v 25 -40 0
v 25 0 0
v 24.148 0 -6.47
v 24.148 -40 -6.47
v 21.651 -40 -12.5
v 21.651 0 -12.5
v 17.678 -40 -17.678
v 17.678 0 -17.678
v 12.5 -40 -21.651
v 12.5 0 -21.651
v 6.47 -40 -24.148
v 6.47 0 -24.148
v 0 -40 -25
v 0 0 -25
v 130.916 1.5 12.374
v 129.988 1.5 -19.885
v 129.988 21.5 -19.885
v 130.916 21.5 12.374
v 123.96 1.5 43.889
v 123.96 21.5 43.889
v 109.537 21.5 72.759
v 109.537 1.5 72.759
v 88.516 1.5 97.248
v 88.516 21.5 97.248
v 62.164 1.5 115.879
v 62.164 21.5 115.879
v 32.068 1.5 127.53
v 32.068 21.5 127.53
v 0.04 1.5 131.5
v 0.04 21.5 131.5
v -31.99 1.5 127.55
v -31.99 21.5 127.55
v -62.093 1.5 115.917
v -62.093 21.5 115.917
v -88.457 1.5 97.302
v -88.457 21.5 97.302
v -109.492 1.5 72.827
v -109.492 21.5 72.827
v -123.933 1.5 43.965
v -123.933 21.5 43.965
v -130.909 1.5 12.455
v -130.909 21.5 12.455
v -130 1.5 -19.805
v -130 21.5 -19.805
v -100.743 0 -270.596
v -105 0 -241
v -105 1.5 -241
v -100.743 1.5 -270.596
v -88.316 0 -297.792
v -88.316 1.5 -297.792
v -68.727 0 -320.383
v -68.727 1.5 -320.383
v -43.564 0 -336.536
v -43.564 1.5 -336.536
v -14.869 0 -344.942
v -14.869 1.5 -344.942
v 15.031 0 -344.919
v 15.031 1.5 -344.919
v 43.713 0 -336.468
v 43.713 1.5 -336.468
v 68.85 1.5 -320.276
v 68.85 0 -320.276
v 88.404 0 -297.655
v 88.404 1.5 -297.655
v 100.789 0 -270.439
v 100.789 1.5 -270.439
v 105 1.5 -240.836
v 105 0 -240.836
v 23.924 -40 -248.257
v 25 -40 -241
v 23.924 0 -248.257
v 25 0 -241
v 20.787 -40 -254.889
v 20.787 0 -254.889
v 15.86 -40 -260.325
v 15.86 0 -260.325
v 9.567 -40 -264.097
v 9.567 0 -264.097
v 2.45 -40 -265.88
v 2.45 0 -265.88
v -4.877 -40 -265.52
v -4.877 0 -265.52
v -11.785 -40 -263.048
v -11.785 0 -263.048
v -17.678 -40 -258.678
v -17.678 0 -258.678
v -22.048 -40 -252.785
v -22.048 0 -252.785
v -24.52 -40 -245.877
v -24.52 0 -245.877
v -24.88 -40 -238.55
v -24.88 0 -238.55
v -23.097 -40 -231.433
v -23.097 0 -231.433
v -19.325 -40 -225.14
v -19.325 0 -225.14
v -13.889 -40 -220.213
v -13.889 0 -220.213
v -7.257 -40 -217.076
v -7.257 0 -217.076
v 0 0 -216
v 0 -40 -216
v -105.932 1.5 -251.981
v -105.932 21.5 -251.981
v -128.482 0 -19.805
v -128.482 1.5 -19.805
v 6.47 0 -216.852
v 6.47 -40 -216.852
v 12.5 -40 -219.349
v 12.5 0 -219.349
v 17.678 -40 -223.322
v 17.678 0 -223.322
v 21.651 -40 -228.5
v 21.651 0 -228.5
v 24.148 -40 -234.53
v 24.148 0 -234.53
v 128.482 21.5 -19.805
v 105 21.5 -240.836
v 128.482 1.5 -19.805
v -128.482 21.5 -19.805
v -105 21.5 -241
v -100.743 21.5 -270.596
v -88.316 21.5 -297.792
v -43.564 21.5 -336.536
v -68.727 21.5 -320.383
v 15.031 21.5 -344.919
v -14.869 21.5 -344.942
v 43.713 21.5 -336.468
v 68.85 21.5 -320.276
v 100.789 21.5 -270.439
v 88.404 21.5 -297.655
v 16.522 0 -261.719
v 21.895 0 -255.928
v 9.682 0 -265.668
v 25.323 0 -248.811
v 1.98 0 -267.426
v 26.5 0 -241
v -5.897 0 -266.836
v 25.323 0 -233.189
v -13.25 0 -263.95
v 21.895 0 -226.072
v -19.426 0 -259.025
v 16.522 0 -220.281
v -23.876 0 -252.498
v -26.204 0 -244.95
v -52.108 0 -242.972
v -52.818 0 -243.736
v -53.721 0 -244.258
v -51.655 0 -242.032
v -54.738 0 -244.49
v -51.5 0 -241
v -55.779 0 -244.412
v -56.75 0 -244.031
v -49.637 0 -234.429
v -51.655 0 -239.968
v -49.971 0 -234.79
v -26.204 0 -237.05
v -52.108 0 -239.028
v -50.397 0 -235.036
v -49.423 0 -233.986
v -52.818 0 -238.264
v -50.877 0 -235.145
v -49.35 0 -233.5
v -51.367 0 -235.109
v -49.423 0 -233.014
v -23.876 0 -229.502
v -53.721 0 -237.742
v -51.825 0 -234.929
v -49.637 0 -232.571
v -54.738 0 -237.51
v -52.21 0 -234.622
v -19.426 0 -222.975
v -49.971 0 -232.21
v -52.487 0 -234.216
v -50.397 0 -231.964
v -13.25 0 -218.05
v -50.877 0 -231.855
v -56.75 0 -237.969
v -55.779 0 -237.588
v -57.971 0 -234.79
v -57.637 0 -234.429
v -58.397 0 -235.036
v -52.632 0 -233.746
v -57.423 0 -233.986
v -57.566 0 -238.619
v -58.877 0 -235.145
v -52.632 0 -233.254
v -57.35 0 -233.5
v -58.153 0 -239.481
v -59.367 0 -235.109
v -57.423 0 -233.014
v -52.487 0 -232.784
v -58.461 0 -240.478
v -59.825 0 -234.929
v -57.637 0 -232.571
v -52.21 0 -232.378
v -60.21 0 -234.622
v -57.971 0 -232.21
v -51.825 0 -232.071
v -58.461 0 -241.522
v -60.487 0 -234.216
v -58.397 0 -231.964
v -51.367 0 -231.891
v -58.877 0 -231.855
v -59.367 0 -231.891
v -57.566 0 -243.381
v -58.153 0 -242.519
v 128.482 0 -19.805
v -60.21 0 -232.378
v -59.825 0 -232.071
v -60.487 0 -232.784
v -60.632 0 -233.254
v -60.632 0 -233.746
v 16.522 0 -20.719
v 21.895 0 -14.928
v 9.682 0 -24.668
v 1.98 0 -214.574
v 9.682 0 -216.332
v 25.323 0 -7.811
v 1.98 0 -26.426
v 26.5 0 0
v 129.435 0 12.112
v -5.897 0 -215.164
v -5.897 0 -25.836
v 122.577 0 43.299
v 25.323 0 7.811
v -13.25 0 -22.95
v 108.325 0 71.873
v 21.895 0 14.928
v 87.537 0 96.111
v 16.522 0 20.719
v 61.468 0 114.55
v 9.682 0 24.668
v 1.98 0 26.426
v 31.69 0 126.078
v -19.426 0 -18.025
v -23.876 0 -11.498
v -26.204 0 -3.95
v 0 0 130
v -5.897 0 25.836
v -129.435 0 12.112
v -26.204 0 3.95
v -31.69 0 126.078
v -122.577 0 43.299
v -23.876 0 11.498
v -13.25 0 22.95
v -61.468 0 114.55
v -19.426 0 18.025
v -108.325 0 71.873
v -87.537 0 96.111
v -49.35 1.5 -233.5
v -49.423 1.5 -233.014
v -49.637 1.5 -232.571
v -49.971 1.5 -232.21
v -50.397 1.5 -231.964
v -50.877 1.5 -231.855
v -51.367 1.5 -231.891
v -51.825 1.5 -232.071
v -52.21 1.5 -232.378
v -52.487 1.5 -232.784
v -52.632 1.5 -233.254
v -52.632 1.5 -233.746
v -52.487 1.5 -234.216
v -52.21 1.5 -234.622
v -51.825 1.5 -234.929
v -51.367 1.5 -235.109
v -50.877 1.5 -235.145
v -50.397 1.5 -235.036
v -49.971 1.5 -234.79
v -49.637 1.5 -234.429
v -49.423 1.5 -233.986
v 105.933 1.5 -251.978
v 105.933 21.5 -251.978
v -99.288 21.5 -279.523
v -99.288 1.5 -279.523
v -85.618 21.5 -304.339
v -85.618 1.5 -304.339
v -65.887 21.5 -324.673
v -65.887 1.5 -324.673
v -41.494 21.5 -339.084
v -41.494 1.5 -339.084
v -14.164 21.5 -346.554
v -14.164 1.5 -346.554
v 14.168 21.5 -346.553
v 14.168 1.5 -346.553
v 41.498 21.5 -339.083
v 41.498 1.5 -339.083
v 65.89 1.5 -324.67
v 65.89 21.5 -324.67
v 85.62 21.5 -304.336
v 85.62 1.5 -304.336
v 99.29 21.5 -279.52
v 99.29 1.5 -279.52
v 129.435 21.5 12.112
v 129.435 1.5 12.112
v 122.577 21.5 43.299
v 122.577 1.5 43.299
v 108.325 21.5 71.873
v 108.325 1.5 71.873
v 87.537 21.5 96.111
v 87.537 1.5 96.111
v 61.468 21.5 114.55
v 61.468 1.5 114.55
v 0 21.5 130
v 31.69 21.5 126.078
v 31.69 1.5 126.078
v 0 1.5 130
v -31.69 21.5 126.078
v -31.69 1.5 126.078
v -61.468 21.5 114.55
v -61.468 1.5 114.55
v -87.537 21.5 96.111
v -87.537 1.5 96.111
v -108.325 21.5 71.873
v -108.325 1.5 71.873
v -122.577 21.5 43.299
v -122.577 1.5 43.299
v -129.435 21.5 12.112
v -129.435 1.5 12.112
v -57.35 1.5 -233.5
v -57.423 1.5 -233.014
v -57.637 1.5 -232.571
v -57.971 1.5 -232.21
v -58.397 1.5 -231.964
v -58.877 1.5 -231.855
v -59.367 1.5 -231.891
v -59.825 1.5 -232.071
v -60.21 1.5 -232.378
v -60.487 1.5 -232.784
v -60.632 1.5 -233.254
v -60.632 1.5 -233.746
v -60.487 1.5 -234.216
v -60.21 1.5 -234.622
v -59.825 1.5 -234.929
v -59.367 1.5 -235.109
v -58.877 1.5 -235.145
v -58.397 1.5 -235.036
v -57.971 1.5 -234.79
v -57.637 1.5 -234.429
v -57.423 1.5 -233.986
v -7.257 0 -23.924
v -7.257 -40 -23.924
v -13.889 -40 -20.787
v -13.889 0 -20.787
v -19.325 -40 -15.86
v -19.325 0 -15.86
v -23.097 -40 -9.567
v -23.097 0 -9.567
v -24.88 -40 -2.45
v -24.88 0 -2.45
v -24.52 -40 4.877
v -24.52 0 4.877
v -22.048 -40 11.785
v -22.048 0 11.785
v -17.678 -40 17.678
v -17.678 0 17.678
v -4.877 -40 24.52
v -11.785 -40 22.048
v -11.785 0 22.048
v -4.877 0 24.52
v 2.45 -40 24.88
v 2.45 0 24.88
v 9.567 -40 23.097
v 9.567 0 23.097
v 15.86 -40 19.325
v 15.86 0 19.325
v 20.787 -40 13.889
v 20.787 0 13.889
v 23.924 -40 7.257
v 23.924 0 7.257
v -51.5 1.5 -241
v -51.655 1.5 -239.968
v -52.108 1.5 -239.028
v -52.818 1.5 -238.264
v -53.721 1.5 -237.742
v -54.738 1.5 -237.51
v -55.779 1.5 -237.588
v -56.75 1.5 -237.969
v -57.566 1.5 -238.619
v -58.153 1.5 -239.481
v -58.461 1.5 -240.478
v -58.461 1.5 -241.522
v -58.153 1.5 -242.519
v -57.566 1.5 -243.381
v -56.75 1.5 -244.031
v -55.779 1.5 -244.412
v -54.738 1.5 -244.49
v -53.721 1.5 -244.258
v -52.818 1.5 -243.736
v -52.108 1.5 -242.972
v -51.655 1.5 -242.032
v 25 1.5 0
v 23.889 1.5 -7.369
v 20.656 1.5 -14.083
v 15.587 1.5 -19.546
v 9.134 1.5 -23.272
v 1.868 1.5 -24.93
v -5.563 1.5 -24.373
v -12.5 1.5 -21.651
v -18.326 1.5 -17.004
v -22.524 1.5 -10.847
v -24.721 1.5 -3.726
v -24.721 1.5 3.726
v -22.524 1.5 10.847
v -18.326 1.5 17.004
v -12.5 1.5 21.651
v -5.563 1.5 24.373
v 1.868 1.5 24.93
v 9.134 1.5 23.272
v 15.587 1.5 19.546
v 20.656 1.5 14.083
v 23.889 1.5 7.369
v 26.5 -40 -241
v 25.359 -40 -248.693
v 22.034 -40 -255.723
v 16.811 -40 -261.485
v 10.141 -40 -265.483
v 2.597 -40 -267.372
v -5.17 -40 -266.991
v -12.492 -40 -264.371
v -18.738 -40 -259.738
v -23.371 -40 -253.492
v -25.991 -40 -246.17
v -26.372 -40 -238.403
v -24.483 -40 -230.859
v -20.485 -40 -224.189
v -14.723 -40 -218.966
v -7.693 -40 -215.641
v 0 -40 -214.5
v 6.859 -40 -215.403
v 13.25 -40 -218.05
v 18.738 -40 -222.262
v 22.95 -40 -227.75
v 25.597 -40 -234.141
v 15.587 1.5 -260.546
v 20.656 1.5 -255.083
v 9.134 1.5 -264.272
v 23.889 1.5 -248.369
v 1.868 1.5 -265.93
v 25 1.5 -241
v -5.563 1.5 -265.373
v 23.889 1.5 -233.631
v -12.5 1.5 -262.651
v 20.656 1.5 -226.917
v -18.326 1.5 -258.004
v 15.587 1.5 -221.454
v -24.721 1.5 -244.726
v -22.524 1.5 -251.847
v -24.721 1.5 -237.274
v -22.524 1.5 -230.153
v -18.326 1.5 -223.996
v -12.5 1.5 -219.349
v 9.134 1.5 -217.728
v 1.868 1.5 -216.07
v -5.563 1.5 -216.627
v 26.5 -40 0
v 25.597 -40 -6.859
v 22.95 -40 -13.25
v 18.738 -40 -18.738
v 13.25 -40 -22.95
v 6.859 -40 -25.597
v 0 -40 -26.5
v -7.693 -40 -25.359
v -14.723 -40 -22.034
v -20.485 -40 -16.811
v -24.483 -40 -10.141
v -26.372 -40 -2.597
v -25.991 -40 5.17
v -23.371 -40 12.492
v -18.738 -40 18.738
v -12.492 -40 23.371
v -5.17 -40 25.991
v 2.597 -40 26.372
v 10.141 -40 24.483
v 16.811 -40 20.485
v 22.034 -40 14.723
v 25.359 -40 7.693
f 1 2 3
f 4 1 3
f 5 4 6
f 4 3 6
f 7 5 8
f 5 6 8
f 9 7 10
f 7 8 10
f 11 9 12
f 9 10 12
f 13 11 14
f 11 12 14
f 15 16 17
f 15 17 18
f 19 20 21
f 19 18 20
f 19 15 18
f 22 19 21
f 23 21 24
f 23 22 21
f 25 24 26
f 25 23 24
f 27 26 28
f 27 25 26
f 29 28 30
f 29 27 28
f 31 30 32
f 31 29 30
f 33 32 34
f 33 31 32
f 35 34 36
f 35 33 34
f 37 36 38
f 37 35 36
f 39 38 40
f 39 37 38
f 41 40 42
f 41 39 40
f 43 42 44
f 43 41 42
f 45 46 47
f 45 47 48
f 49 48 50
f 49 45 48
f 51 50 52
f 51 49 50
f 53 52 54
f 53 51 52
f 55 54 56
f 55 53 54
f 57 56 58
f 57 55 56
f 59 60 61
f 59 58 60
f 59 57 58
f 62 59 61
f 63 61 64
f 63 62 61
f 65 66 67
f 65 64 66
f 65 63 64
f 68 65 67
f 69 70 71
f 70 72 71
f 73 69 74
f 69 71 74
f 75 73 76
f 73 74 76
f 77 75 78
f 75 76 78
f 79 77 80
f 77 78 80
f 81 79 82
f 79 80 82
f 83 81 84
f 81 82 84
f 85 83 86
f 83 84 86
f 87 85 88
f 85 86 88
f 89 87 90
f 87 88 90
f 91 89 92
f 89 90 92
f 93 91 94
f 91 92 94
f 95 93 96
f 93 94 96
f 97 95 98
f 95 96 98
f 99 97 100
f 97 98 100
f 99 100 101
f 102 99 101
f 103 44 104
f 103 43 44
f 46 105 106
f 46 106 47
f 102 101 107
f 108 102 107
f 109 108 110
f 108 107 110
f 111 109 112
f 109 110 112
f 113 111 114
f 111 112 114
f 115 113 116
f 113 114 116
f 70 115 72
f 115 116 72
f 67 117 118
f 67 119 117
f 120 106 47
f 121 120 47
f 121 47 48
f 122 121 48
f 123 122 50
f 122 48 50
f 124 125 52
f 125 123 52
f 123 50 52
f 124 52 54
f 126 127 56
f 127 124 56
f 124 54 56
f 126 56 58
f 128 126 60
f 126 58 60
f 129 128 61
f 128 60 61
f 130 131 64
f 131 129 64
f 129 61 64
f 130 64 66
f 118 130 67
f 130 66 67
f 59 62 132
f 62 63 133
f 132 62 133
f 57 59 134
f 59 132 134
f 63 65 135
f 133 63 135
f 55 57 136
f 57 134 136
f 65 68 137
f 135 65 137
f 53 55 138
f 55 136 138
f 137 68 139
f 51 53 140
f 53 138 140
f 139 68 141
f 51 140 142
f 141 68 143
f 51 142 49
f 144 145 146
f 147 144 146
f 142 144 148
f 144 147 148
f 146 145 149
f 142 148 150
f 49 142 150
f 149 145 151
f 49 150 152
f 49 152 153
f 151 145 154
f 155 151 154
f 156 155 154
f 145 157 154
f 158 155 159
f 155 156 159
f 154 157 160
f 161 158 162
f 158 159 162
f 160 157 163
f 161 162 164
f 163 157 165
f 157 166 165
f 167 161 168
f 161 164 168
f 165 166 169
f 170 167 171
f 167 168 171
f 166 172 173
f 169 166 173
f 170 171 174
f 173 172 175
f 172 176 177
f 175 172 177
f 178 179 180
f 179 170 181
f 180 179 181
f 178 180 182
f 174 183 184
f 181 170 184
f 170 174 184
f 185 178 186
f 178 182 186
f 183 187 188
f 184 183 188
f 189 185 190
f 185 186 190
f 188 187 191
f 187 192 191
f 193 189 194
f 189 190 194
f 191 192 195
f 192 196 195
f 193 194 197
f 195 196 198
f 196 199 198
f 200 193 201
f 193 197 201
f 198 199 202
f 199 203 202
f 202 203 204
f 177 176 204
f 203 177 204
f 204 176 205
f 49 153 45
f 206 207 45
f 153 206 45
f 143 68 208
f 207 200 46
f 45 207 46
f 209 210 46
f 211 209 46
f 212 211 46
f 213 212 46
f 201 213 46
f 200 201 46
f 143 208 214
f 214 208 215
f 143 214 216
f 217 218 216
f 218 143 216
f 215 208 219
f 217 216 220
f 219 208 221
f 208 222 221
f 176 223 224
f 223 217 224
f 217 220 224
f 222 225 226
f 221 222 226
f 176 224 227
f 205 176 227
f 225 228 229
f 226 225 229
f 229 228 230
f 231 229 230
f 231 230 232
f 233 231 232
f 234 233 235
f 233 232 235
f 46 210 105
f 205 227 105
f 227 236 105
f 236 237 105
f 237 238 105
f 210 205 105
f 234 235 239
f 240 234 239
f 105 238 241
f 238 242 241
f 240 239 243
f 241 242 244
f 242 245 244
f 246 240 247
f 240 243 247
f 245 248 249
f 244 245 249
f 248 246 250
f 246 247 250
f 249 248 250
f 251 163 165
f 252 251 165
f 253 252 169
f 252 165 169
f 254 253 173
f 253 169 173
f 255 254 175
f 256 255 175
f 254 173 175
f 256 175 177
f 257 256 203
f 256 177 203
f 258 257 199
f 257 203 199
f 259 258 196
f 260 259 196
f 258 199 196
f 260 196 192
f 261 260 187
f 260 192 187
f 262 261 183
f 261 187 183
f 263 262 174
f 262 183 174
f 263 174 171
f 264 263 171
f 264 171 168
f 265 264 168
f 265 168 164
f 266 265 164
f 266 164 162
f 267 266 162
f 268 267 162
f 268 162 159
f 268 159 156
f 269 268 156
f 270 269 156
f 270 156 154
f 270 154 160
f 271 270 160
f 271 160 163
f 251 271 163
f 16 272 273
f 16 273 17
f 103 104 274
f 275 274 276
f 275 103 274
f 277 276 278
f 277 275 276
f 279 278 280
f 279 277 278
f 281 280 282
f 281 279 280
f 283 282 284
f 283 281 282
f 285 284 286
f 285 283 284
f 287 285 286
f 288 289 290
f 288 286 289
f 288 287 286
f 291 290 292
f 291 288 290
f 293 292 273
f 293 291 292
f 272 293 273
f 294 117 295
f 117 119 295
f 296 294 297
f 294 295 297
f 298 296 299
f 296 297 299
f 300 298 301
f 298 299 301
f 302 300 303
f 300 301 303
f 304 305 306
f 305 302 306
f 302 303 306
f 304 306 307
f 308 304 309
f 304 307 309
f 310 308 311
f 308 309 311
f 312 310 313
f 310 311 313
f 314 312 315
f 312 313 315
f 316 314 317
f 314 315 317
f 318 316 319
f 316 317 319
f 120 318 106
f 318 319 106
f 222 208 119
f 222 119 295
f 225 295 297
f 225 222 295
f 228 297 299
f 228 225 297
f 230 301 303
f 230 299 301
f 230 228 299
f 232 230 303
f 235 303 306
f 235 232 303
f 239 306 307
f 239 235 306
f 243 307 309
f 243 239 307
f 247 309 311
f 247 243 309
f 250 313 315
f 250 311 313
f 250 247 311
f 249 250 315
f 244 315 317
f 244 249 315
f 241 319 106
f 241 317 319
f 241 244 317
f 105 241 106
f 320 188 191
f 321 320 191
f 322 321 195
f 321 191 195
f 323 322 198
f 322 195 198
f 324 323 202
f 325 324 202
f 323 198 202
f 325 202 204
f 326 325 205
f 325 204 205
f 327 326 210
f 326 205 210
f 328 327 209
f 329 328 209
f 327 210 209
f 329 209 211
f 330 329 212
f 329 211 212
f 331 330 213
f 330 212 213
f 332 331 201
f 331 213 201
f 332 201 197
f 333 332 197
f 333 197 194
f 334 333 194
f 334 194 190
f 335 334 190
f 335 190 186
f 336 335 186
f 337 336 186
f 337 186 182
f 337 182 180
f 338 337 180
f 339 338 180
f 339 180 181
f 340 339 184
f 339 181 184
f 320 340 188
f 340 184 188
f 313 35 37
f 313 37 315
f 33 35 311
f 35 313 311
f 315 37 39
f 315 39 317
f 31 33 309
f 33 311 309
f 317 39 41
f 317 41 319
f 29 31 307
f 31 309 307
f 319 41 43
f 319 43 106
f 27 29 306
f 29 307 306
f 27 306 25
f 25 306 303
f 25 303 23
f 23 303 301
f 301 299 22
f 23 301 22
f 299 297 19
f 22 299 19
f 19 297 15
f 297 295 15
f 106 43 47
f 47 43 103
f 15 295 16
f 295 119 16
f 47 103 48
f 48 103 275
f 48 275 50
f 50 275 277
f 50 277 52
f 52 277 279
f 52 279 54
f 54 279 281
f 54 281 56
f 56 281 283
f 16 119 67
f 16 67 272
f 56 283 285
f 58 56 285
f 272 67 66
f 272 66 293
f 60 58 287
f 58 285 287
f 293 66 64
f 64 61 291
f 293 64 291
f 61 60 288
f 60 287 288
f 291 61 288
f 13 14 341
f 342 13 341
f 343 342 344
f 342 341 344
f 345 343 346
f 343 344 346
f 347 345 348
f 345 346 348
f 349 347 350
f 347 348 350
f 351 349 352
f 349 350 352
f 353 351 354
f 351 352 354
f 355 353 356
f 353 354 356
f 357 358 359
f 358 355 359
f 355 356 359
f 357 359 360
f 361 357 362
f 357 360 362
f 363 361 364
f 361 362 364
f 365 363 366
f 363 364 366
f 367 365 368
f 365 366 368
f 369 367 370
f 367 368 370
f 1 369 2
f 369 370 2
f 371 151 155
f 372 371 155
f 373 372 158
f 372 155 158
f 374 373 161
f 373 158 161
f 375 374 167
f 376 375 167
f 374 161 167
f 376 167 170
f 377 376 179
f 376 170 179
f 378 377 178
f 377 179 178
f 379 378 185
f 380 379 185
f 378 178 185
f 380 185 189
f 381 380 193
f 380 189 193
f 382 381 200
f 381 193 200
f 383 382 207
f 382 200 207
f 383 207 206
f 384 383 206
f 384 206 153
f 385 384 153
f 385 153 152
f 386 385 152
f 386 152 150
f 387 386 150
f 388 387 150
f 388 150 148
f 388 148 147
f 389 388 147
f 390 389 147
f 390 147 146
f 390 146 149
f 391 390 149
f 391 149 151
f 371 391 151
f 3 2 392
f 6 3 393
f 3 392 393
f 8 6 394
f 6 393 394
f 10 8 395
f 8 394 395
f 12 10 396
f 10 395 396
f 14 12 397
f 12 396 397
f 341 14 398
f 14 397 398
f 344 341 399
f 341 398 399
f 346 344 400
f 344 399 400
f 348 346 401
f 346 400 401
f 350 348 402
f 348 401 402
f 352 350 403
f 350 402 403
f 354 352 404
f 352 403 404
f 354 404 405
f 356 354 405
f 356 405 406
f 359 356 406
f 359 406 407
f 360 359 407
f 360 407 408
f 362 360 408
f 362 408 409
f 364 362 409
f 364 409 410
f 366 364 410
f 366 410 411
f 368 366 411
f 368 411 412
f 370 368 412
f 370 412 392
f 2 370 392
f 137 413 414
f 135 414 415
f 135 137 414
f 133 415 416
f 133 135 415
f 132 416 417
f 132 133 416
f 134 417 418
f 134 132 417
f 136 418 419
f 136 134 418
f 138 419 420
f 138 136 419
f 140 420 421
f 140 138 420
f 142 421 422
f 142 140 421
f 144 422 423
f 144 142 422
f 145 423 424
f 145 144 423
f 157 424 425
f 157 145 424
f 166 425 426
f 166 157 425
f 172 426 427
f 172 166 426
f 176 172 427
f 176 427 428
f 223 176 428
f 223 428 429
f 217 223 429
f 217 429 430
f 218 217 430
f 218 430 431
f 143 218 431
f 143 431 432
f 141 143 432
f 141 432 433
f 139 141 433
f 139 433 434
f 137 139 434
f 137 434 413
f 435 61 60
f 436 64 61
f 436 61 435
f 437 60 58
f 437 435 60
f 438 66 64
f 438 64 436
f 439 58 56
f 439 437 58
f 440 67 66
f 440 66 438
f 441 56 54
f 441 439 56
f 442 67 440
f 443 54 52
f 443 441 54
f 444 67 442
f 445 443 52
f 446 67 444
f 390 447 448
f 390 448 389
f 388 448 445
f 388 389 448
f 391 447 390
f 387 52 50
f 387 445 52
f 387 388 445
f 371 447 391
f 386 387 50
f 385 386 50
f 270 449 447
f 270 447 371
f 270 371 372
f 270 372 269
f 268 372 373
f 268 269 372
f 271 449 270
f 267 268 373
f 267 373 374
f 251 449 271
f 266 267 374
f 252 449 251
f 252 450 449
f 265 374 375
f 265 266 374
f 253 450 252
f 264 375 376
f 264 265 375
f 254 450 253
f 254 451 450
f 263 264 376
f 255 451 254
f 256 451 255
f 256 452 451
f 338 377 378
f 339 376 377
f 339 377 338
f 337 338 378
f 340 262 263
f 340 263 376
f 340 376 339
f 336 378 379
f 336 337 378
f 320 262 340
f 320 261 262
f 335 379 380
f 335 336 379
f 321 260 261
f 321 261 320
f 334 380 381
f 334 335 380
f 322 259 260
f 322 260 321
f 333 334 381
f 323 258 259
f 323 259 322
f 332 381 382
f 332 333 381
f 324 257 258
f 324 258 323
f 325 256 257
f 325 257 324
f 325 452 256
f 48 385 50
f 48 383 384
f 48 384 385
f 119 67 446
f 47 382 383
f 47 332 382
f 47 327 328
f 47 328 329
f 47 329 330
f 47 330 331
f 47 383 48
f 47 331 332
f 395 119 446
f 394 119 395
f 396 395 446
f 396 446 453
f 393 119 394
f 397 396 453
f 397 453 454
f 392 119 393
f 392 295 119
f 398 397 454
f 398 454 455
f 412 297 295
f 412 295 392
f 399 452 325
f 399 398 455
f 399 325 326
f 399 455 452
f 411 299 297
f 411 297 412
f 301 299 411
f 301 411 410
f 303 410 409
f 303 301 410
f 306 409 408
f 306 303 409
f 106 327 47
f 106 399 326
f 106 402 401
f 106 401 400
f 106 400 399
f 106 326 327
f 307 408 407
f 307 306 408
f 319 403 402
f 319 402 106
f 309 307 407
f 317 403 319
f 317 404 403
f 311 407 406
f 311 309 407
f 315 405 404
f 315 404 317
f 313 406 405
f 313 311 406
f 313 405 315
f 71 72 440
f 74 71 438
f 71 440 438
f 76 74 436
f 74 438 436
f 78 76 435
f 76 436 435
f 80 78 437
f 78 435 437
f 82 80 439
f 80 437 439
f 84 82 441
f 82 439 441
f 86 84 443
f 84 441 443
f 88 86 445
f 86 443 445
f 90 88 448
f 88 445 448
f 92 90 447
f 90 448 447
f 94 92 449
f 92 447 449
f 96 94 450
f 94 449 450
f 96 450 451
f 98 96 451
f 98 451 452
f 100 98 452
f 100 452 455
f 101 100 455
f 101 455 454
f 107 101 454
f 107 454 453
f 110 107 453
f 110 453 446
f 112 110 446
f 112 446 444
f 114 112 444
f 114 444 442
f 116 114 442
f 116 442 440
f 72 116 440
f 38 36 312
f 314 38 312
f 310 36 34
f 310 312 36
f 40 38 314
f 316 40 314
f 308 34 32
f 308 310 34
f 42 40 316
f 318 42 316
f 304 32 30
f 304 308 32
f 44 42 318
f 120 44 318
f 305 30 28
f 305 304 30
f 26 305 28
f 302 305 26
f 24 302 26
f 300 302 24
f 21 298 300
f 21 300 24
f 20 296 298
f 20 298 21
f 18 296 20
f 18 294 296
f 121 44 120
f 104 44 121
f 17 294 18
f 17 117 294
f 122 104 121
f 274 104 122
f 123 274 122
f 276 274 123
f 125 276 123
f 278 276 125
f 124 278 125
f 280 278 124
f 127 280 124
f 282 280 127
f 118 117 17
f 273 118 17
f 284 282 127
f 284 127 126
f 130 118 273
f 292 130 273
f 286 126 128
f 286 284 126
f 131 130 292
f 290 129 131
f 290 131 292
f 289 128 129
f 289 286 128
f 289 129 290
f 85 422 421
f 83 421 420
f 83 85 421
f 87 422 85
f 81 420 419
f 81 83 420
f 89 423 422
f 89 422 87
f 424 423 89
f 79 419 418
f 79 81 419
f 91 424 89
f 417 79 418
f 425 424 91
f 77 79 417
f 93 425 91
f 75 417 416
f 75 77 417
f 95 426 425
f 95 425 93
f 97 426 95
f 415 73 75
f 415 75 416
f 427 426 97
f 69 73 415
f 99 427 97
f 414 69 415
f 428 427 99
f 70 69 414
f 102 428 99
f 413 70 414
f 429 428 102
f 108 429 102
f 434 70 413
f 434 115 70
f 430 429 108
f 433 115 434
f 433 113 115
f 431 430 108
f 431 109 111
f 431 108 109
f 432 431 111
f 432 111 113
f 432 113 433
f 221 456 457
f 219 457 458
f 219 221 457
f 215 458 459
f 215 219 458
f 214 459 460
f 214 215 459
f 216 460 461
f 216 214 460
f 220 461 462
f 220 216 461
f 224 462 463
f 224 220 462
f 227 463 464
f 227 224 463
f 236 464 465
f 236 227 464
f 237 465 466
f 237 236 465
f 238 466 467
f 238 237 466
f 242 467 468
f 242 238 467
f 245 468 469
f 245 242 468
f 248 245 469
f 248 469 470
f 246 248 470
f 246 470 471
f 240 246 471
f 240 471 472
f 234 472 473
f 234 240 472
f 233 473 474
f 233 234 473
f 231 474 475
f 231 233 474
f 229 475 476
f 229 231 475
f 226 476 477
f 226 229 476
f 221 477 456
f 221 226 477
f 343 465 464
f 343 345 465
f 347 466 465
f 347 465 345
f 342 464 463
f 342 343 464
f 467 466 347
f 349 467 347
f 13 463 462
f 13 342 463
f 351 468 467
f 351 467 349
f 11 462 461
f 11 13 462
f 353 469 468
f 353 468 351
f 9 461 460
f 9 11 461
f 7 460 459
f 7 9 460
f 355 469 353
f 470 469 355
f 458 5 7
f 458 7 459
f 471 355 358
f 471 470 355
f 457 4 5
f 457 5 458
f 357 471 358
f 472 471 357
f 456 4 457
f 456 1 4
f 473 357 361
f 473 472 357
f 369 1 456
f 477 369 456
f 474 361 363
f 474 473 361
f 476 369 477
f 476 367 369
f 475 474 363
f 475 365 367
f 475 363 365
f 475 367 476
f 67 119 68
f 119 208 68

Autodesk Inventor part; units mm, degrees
ref_plane "YZ Plane" through (0, 0, 0) normal (1, 0, 0) x (0, 1, 0)
ref_plane "XZ Plane" through (0, 0, 0) normal (0, 1, 0) x (-1, 0, 0)
ref_plane "XY Plane" through (0, 0, 0) normal (0, 0, 1) x (1, 0, 0)
sketch "Esboço1" plane through (0, 0, 0) normal (0, 1, 0) x (-1, 0, 0)
  arc A0 (128.4825, -19.8053) -> (-128.4825, -19.8053) centre (0, 0) ccw
  arc A1 (130, -19.8053) -> (-130, -19.8053) centre (0, 0) ccw
  line L0 (0, 0) -> (0, -241) construction
  arc A2 (-104.9999, -240.8364) -> (105, -241) centre (0, -241) ccw
  arc A3 (-106.5, -241) -> (106.5, -241) centre (0, -241) ccw
  line L1 (130, -19.8053) -> (106.5, -241)
  line L2 (-130, -19.8053) -> (-106.5, -241)
  line L3 (128.4825, -19.8053) -> (105, -241)
  line L4 (-128.4825, -19.8053) -> (-104.9999, -240.8364)
  dimension "d0" = 260
  dimension "d1" = 263
  dimension "d2" = 241
  dimension "d3" = 210
  dimension "d4" = 213
extrude "Extrusão1" add sketch "Esboço1" along normal blind 1.5 contours L3 A2 L4 A0
sketch "Esboço2" plane through (0, 1.5, 0) normal (0, 1, 0) x (1, 0, 0)
  arc A0 (-130, 19.8053) -> (129.9878, 19.8852) centre (0, 0) ccw
  line L0 (0, 0) -> (0, 241) construction
  arc A1 (105.9327, 251.9775) -> (-105.9324, 251.9811) centre (0, 241) ccw
  line L1 (-130, 19.8053) -> (-105.9324, 251.9811)
  arc A2 (-128.4825, 19.8053) -> (128.4825, 19.8053) centre (0, 0) ccw projected
  line L2 (-128.4825, 19.8053) -> (-105, 241)
  arc A3 (104.9999, 240.8364) -> (-105, 241) centre (0, 241) ccw projected
  line L3 (105.9324, 251.9811) -> (129.9878, 19.8852)
  line L4 (128.4825, 19.8053) -> (104.9999, 240.8364) projected
  line L5 (128.4825, 19.8053) -> (104.9999, 240.8364)
  dimension "d7" = 263
  dimension "d8" = 241
  dimension "d9" = 213
extrude "Extrusão2" add sketch "Esboço2" along normal blind 20
sketch "Esboço3" plane through (0, 1.5, 0) normal (0, 1, 0) x (1, 0, 0)
  circle A0 centre (0, 0) radius 25
  line L0 (0, 0) -> (0, 241)
  circle A1 centre (0, 241) radius 25
  dimension "d12" = 50
  dimension "d13" = 241
  dimension "d14" = 50
extrude "Extrusão3" cut sketch "Esboço3" against normal blind 20
sketch "Esboço4" plane through (0, 0, 0) normal (0, -1, 0) x (1, 0, 0)
  circle A0 centre (0, 0) radius 26.5
  line L0 (0, 0) -> (0, -241)
  circle A1 centre (0, -241) radius 26.5
  circle A2 centre (0, 0) radius 25
  circle A3 centre (0, -241) radius 25
  dimension "d17" = 53
  dimension "d18" = 241
  dimension "d19" = 53
  dimension "d20" = 50
  dimension "d21" = 50
extrude "Extrusão4" add sketch "Esboço4" along normal blind 40
sketch "Esboço5" plane through (0, 1.5, 0) normal (0, 1, 0) x (1, 0, 0)
  point P0 (0, 0)
sketch "Esboço6" plane through (0, 0, 0) normal (0, -1, 0) x (1, 0, 0)
  point P0 (0, 0)
sketch "Esboço7" plane through (0, 0, 0) normal (0, -1, 0) x (1, 0, 0)
  circle A0 centre (0, -241) radius 25 projected
  circle A1 centre (-55, -241) radius 3.5
  point P0 (0, 0)
  dimension "d24" = 7
  dimension "d25" = 55
extrude "Extrusão5" cut sketch "Esboço7" against normal blind 10 contours A1
sketch "Esboço8" plane through (0, 0, 0) normal (0, -1, 0) x (1, 0, 0)
  circle A0 centre (-51, -233.5) radius 1.65
  circle A1 centre (-59, -233.5) radius 1.65
  circle A2 centre (-55, -241) radius 3.5 projected
  circle A3 centre (-55, -241) radius 3.5
  point P0 (0, 0)
  dimension "d28" = 3.3
  dimension "d29" = 3.3
  dimension "d50" = 7.5
  dimension "d51" = 4
  dimension "d52" = 7.5
  dimension "d53" = 4
extrude "Extrusão6" cut sketch "Esboço8" against normal blind 10 contours A0 | A1
equation "\"Raio_vergadura\" = Espessura"
equation "\"Largura_alívio_de_vergadura\" = Espessura"
equation "\"Profundidade_alívio_de_vergadura\" = 0.5 * Espessura"
equation "\"Tamanho_alívio_de_dobra\" = 4 * Espessura"
equation "\"Remanescente_mínimo\" = 2 * Espessura"
equation "\"Raiodetransição\" = Raio_vergadura"
equation "\"Tamanho_de_raio_de_Jacobi\" = Raio_vergadura"
equation "\"TamanhoFolga\" = Espessura"
equation "\"Espessura\" = 0.5"
properties part number "Tampa Capa CVT"
